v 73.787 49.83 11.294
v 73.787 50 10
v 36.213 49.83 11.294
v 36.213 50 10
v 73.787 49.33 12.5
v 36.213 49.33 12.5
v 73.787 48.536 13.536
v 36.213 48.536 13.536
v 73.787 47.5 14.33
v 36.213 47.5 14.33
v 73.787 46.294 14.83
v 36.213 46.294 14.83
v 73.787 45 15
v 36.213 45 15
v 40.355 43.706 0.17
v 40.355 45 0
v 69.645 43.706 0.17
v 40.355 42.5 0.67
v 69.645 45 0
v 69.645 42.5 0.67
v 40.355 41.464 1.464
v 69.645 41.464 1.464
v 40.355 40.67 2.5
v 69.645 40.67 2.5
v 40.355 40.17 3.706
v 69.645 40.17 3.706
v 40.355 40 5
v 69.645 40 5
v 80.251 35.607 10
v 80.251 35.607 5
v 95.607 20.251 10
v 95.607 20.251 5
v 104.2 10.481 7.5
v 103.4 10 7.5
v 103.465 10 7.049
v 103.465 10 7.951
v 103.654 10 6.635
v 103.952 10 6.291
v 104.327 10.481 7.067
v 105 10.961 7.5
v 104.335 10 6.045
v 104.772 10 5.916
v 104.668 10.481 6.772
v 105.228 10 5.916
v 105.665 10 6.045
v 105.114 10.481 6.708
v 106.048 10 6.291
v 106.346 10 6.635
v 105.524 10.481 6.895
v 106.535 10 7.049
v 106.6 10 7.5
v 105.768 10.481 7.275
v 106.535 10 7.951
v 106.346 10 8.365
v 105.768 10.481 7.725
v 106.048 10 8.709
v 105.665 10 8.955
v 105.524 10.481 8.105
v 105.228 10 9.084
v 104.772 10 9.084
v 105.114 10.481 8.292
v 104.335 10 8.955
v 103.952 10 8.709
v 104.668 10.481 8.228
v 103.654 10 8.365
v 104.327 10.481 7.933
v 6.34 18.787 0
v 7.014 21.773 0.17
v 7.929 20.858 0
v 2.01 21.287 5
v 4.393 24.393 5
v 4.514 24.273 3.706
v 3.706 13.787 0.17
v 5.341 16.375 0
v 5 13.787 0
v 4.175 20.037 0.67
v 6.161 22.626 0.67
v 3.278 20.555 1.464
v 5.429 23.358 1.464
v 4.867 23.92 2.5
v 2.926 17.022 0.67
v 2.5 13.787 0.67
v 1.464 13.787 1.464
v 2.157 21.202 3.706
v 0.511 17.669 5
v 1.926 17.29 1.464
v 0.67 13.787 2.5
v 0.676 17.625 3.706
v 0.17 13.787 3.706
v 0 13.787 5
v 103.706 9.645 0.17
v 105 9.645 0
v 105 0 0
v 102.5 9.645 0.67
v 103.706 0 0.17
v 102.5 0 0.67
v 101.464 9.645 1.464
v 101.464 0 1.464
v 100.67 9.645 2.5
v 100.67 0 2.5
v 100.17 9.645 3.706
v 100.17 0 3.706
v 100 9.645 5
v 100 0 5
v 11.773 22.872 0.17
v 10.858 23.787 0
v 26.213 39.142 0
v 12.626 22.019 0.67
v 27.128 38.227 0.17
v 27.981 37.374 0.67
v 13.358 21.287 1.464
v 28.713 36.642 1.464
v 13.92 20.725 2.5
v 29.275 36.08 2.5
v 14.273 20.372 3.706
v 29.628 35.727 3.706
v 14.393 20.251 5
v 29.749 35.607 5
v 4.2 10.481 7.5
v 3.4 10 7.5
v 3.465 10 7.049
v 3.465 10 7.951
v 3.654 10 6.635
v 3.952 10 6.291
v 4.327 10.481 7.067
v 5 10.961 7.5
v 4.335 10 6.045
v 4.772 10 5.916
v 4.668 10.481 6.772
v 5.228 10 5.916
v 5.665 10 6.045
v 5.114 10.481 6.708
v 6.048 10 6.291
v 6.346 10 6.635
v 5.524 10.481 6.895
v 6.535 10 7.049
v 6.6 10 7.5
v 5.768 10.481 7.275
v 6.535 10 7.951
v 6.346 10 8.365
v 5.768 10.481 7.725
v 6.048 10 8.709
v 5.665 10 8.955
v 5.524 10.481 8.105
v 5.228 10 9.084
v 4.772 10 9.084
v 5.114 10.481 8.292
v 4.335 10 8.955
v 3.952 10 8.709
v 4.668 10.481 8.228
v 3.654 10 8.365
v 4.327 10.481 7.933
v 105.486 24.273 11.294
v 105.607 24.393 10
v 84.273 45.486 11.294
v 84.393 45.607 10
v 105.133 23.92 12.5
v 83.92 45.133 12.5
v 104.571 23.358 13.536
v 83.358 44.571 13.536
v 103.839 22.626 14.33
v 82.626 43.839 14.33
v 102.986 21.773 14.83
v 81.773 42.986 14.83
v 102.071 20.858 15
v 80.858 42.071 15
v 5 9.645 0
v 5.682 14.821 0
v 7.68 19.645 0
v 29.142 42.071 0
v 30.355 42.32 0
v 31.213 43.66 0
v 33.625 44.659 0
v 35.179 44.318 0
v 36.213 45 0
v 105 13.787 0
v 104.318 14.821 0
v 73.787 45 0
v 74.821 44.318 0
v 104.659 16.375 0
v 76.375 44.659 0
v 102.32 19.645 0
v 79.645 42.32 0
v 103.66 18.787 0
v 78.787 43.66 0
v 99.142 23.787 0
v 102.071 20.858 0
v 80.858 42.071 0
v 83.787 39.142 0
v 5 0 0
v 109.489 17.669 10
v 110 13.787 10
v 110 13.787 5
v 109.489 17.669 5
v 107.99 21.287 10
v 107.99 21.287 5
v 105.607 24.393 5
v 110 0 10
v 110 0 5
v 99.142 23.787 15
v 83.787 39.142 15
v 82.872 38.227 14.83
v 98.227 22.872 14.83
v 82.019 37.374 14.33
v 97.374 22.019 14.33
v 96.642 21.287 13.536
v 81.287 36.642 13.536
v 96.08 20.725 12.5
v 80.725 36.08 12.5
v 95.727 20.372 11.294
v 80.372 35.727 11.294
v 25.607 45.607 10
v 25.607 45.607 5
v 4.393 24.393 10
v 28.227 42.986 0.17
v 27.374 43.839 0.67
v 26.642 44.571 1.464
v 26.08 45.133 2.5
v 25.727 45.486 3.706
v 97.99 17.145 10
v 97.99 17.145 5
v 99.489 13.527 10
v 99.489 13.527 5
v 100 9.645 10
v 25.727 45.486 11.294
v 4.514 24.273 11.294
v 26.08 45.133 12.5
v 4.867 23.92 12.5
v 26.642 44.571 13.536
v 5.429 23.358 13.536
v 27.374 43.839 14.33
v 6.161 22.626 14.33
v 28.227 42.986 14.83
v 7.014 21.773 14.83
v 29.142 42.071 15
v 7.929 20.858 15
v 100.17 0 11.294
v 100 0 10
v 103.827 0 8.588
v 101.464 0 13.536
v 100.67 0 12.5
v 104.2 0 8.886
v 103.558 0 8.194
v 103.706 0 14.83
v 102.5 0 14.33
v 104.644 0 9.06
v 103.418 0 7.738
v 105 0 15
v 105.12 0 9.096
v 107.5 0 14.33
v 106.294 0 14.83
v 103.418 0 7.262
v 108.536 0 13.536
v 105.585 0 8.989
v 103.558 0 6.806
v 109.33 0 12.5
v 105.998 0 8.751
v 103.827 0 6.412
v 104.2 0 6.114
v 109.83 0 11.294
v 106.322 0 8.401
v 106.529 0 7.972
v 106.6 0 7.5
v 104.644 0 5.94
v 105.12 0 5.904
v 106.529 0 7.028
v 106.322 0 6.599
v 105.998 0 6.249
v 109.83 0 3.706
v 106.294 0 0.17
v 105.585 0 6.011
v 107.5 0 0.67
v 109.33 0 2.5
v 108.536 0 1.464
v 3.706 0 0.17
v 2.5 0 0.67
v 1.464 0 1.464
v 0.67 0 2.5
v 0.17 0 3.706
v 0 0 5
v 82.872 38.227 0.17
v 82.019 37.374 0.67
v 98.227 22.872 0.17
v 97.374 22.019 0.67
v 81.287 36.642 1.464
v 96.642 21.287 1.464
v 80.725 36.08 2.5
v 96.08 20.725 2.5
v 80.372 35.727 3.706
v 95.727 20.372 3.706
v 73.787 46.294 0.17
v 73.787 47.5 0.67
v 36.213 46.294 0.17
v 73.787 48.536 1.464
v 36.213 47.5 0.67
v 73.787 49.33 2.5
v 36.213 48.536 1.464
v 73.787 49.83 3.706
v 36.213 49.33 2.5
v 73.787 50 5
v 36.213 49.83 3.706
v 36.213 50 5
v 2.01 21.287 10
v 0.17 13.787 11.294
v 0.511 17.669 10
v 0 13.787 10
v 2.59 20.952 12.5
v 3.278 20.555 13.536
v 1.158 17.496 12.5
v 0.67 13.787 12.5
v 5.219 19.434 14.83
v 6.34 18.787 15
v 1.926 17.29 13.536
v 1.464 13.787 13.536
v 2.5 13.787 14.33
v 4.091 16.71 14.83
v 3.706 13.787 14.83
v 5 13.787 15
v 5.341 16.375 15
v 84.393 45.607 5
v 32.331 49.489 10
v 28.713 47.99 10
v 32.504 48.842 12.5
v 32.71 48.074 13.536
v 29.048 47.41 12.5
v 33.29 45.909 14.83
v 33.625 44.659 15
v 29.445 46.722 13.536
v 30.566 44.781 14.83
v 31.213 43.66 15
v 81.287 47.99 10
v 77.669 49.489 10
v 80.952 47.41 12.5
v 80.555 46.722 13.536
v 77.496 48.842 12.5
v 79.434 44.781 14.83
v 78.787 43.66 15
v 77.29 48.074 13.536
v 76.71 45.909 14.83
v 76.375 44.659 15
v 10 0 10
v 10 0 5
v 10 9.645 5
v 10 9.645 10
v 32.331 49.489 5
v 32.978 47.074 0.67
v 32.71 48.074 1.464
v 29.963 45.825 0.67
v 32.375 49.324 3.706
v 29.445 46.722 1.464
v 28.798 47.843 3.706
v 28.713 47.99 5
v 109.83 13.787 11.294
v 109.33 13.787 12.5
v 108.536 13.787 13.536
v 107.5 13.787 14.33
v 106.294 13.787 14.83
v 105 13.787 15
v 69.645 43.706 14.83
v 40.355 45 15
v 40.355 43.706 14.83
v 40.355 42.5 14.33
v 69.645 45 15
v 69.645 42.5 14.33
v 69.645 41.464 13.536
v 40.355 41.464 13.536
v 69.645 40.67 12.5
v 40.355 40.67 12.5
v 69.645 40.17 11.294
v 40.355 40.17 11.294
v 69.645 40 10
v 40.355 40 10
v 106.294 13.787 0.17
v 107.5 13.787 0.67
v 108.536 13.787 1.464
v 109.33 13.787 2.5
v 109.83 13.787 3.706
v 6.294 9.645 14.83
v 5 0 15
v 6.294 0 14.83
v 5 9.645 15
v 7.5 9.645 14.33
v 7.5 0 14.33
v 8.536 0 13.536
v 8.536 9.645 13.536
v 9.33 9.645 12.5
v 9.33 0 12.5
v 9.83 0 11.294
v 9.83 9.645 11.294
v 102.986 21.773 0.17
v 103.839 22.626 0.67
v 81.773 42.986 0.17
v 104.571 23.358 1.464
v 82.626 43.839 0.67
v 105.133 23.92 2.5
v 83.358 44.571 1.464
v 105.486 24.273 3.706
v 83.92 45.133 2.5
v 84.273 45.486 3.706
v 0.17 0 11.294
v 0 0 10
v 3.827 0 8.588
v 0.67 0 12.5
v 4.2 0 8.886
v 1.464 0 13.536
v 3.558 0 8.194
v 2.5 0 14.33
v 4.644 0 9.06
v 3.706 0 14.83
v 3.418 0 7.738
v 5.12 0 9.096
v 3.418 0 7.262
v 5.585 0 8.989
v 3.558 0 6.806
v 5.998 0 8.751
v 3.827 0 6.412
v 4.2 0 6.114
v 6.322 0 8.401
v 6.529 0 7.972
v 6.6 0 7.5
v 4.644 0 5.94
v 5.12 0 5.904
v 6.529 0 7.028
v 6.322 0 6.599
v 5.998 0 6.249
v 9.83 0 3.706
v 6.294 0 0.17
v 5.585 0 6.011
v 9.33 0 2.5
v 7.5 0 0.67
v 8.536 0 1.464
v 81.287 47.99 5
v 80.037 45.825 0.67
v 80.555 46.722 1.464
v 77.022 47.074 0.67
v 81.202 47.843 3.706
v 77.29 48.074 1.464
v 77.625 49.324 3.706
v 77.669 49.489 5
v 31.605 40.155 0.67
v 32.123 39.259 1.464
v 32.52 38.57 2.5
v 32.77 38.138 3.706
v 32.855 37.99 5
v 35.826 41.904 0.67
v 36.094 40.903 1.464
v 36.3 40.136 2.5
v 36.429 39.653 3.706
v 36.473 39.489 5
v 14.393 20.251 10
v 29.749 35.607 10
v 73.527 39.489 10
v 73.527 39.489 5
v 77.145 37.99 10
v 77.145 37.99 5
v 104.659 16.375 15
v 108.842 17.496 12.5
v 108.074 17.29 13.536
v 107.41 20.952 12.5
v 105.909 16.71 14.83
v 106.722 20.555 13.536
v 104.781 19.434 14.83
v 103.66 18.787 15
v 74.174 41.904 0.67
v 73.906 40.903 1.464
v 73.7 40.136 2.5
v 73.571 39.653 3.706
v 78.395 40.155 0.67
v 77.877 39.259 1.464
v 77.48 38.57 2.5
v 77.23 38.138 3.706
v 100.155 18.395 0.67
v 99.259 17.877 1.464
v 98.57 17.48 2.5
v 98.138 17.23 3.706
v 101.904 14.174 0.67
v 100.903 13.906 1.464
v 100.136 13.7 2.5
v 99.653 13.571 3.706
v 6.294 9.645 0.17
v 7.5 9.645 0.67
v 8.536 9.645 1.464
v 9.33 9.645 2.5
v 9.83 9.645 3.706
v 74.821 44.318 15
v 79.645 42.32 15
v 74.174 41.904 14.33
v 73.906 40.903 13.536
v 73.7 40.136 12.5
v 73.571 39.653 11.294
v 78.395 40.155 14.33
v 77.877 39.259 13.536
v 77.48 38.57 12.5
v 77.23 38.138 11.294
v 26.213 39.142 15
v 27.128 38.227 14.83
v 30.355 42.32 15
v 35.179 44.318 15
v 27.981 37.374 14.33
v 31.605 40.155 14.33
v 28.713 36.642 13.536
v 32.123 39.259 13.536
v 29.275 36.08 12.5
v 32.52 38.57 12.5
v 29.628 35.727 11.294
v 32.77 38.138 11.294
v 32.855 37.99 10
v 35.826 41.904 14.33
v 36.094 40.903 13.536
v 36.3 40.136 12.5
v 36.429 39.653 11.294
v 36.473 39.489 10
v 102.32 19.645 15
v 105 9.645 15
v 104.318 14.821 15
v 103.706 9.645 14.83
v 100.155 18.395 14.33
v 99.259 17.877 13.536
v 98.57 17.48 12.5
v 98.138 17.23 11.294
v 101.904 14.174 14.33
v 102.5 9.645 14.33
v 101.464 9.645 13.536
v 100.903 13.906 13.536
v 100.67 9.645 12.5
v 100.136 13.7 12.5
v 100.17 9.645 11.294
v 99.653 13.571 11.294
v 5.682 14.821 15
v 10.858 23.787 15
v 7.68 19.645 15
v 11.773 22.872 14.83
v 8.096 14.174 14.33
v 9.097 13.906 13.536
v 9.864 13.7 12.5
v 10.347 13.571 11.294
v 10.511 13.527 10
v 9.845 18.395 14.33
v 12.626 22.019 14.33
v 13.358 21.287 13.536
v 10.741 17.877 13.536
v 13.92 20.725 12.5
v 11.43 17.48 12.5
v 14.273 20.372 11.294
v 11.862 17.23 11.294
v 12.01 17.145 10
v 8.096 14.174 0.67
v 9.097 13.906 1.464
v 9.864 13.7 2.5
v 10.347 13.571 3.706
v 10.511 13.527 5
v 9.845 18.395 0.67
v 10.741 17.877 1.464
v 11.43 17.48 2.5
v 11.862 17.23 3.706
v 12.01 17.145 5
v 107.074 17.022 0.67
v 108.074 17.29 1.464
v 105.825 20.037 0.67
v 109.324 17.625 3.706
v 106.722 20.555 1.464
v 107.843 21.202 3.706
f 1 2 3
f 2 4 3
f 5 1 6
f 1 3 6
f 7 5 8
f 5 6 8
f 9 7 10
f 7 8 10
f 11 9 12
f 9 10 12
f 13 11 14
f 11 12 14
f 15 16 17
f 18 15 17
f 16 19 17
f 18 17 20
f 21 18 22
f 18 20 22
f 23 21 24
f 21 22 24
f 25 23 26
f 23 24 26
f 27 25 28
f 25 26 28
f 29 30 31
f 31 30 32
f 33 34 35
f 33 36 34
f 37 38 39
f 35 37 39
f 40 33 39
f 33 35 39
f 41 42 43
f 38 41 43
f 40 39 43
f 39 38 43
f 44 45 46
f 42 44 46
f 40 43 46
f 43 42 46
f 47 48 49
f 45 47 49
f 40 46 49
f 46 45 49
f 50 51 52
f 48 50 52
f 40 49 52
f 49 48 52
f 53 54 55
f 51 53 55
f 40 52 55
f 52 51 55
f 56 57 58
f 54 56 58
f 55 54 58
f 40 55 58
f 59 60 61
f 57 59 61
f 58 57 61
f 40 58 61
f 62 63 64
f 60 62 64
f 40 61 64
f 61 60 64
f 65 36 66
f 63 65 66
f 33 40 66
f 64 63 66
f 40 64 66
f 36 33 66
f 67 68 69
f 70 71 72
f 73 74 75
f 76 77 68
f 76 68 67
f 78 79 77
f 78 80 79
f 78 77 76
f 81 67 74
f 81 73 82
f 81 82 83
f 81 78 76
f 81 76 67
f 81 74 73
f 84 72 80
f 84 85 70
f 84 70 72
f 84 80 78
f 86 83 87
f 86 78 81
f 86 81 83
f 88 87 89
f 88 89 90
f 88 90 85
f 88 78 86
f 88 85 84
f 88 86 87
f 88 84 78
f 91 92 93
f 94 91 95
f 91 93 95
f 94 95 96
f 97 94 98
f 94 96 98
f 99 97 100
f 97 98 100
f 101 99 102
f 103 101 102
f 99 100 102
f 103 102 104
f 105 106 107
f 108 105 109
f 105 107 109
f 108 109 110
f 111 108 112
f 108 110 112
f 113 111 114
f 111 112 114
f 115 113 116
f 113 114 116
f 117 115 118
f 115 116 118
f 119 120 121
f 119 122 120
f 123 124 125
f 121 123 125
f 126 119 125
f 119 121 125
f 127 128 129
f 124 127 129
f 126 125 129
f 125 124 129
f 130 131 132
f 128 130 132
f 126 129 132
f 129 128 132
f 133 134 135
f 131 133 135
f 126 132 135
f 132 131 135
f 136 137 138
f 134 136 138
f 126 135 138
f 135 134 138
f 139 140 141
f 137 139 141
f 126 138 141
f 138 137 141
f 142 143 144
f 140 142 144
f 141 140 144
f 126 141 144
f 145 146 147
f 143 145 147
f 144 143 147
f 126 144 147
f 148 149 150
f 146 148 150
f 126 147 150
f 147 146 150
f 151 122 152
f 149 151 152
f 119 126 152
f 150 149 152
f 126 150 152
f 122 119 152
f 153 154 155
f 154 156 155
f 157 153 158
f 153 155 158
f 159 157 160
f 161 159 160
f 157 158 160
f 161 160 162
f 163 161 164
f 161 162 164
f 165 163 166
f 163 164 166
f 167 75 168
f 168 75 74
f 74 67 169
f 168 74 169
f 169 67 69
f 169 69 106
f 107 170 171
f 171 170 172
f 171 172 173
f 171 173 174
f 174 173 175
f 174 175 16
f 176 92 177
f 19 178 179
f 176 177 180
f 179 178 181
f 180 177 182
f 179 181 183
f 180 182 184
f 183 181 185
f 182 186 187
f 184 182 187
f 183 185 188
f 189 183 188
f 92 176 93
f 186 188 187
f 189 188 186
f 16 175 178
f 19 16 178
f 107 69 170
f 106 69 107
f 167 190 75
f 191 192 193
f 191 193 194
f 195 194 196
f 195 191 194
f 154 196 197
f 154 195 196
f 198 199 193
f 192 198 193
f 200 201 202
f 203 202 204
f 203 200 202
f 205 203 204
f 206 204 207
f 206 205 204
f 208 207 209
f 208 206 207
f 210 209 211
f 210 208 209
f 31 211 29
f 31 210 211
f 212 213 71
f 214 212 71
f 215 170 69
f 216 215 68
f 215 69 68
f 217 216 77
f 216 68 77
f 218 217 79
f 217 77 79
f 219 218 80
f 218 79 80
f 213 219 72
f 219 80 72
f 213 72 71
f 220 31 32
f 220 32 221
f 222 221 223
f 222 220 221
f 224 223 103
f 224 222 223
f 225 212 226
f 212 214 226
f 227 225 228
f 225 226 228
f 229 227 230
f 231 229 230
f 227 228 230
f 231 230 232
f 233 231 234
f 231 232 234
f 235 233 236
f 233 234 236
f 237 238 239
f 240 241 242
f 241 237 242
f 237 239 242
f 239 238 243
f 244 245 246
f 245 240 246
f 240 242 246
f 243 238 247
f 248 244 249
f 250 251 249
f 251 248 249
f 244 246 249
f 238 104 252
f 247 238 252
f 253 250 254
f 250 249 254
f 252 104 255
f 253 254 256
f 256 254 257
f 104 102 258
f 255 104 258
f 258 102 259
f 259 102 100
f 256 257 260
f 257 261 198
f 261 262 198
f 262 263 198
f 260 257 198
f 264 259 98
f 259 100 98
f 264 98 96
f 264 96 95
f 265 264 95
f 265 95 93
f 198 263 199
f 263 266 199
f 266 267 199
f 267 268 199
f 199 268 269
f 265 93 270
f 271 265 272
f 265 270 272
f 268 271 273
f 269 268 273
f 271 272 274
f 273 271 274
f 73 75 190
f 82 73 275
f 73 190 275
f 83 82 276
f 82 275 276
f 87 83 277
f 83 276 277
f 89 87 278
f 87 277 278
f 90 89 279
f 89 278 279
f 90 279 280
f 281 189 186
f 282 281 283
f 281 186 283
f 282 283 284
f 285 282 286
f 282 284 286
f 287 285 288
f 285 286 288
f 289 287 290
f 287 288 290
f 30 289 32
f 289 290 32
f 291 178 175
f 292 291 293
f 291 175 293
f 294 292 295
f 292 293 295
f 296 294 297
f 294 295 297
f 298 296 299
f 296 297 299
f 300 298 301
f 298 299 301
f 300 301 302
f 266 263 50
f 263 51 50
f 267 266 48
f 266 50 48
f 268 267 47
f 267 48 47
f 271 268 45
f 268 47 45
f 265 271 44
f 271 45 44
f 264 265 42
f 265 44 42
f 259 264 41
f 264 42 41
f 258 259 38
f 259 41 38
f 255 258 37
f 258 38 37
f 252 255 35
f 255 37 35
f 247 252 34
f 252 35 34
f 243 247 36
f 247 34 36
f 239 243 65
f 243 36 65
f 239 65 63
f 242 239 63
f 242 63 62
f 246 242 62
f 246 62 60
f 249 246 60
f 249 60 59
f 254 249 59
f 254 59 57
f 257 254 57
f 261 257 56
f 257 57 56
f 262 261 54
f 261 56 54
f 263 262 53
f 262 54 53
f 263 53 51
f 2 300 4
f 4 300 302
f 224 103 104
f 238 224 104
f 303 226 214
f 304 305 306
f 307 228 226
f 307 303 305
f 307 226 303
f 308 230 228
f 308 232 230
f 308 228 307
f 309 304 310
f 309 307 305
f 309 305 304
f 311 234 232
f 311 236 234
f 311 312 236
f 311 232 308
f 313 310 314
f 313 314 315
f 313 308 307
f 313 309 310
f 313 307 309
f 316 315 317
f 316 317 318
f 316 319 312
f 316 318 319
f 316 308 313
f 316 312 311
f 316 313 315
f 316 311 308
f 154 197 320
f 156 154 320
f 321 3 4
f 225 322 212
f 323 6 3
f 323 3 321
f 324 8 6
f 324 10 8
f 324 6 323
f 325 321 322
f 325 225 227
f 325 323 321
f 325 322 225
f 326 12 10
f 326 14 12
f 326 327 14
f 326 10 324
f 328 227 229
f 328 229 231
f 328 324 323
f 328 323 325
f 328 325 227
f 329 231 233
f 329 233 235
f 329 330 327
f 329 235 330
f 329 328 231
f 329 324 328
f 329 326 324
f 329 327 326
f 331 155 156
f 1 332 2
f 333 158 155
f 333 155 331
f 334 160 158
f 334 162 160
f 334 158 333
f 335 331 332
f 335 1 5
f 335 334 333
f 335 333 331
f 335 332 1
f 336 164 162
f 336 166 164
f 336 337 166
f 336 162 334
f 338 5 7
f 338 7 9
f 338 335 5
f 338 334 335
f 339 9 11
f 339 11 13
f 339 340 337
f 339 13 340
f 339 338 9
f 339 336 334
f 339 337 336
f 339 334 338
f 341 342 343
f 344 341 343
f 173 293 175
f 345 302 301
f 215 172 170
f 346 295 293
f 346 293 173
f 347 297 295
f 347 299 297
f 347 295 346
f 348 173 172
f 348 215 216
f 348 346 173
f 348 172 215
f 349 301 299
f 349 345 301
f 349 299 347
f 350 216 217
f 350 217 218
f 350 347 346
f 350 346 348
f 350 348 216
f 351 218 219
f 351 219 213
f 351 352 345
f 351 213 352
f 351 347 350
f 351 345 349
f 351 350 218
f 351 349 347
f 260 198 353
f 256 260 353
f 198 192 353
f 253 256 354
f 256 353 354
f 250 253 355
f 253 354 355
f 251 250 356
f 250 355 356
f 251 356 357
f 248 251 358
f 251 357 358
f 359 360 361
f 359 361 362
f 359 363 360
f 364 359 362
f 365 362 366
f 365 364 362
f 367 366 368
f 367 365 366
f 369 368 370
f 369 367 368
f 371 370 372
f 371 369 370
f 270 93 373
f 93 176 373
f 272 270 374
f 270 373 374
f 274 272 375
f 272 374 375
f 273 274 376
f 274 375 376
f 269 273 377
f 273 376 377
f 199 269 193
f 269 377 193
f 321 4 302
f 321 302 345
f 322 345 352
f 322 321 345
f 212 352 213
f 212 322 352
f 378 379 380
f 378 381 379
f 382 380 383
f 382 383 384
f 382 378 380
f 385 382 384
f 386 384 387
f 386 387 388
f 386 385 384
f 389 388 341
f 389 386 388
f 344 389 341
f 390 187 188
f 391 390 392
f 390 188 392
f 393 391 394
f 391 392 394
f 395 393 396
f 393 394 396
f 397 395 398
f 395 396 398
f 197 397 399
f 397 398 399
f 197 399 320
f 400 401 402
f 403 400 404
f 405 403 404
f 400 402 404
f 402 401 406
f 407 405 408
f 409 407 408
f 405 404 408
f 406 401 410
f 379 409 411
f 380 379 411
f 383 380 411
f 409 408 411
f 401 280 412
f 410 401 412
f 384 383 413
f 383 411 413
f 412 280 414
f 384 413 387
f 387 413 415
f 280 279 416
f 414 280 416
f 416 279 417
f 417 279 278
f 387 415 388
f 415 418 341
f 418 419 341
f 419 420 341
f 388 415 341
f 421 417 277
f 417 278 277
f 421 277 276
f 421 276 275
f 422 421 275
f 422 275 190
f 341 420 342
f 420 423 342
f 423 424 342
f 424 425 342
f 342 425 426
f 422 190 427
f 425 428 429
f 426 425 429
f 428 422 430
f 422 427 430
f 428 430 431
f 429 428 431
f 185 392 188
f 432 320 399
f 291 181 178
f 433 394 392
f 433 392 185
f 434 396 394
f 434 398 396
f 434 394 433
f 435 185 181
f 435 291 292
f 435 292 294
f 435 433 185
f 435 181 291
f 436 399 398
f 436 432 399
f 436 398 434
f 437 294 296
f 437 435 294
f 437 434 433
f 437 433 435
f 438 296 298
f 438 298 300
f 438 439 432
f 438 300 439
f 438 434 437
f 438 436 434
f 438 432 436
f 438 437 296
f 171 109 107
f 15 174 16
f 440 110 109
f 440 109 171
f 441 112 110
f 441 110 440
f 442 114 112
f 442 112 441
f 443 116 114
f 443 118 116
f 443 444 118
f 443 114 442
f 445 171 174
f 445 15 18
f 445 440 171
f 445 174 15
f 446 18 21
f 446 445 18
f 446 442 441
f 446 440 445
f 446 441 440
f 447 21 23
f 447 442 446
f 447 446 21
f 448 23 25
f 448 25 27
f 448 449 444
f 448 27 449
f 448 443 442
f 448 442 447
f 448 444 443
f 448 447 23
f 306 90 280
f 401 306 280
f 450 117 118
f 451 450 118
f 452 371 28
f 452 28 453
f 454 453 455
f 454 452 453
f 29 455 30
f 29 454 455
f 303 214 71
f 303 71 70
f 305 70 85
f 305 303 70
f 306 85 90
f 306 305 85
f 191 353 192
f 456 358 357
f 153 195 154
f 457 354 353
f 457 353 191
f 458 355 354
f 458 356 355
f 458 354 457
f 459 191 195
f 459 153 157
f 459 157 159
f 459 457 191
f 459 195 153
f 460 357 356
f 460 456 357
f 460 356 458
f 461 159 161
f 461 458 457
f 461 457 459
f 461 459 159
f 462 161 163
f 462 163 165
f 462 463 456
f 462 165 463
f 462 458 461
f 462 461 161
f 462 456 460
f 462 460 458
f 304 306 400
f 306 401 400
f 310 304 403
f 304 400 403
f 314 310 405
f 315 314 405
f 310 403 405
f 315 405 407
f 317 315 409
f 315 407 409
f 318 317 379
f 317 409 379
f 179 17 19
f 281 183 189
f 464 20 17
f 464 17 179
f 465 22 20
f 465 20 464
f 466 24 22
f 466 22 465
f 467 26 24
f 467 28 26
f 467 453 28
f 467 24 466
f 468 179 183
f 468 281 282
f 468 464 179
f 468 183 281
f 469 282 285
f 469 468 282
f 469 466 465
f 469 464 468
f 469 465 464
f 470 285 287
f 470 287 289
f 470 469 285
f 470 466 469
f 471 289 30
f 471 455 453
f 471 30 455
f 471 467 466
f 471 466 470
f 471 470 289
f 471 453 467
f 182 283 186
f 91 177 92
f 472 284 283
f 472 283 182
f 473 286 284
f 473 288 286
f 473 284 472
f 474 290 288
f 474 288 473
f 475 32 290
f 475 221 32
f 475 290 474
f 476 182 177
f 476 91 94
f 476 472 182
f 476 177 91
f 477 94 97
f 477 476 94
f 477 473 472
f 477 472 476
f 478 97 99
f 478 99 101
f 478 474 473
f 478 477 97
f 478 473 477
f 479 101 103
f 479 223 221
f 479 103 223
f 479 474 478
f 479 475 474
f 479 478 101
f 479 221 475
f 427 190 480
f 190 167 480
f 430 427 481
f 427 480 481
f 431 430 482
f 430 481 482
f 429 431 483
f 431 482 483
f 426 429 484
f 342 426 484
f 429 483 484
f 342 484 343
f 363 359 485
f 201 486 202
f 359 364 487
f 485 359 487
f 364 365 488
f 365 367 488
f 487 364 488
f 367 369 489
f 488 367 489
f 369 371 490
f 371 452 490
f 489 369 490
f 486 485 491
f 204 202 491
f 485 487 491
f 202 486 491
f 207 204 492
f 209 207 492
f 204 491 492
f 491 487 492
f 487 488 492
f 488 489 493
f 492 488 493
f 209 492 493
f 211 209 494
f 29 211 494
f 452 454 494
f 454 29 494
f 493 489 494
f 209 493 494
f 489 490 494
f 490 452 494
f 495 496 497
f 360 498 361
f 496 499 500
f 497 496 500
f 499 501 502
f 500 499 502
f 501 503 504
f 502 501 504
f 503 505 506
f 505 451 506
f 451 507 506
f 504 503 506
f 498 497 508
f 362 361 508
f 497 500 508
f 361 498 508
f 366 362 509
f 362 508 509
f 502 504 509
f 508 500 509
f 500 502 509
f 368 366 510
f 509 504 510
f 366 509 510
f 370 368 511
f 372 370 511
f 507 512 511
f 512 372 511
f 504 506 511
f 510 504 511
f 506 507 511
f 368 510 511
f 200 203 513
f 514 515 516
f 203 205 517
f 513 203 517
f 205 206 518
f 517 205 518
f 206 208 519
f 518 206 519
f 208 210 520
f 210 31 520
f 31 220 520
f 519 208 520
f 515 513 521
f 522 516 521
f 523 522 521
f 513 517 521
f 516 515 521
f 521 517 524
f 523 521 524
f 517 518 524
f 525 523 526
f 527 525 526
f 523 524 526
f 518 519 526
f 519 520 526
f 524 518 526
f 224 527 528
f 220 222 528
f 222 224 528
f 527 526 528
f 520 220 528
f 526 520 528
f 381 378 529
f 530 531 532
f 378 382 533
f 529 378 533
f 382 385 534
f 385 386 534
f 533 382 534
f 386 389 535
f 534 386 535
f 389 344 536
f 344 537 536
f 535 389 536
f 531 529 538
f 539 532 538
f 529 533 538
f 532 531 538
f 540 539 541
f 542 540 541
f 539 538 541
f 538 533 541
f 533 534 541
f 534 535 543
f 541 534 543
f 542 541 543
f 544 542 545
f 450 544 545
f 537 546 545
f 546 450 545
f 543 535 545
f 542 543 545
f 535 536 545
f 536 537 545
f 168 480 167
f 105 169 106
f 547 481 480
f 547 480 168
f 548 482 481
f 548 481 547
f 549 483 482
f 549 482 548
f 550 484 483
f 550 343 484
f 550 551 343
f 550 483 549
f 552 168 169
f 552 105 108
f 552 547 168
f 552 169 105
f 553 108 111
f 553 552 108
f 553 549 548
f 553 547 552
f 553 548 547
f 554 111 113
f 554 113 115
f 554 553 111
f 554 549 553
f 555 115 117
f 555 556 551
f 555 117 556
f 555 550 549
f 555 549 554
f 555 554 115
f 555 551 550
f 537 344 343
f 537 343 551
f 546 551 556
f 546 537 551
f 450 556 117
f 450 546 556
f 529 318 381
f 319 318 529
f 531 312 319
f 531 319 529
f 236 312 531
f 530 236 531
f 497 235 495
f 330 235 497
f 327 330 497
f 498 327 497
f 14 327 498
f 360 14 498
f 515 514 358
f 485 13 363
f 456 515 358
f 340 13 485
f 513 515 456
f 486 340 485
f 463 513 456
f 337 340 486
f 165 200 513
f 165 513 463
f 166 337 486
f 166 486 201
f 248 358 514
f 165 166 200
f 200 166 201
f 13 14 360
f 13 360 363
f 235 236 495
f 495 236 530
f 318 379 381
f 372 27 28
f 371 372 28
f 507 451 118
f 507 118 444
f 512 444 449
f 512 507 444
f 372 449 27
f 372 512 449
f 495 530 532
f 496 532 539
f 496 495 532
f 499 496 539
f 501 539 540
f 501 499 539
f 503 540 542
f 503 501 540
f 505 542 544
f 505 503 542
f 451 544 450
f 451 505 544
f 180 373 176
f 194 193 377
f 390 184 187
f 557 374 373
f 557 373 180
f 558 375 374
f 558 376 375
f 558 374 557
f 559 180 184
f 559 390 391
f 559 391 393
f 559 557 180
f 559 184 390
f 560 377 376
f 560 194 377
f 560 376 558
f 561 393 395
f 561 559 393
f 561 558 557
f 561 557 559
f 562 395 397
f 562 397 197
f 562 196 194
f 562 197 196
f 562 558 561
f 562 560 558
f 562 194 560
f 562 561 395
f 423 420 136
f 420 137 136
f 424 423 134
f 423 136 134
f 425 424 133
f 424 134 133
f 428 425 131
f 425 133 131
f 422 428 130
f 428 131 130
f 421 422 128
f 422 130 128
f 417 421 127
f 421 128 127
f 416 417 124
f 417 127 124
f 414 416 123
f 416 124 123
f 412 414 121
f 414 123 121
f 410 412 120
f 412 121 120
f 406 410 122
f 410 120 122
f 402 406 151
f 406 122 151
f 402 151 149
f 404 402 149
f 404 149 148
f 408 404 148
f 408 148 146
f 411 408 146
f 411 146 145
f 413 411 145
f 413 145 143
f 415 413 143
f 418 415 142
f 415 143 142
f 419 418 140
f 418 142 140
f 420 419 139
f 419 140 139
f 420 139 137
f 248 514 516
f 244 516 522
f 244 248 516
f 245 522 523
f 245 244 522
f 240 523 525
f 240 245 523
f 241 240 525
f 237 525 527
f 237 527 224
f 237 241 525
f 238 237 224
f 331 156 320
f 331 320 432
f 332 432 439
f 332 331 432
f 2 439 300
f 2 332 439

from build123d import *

# Parameters (mm, degrees)
BOSS_EXTRU_1_DEPTH                  = 15
CONG_4_R                            = 15
CONG_5_R                            = 5
DIAM_TRE_DU_PER_AGE_3_2_3_2_1_D     = 3.2
DIAM_TRE_DU_PER_AGE_3_2_3_2_1_DEPTH = 10
DIAM_TRE_DU_PER_AGE_3_2_3_2_1_TIP   = 0.96137699


with BuildPart() as part:
    # Esquisse1 → Boss.-Extru.1 (new body)
    with BuildSketch(Plane.XY):
        Polygon((100, 0), (110, 0), (110, 20), (80, 50), (30, 50), (0, 20), (0, 0), (10, 0), (10, 15.857864376), (34.142135624, 40), (75.857864376, 40), (100, 15.857864376), align=None)
    extrude(amount=BOSS_EXTRU_1_DEPTH)

    # Congé4
    cong_4_edges = [part.edges().sort_by_distance(p)[0] for p in [
        (0, 20, 7.5),
        (30, 50, 7.5),
        (80, 50, 7.5),
        (110, 20, 7.5),
        (100, 15.857864376, 7.5),
        (75.857864376, 40, 7.5),
        (34.142135624, 40, 7.5),
        (10, 15.857864376, 7.5),
    ]]
    fillet(cong_4_edges, radius=CONG_4_R)

    # Congé5
    cong_5_edges = [part.edges().sort_by_distance(p)[0] for p in [
        (100, 4.82233047, 0),
        (98.858192988, 15.384912426, 0),
        (87.928932188, 27.928932188, 0),
        (75.384912426, 38.858192988, 0),
        (55, 40, 0),
        (34.615087574, 38.858192988, 0),
        (22.071067812, 27.928932188, 0),
        (11.141807012, 15.384912426, 0),
        (10, 4.82233047, 0),
        (0, 6.893398282, 0),
        (1.141807012, 19.52704805, 0),
        (15, 35, 0),
        (30.47295195, 48.858192988, 0),
        (55, 50, 0),
        (79.52704805, 48.858192988, 0),
        (95, 35, 0),
        (108.858192988, 19.52704805, 0),
        (110, 6.893398282, 0),
        (110, 6.893398282, 15),
        (108.858192988, 19.52704805, 15),
        (95, 35, 15),
        (79.52704805, 48.858192988, 15),
        (0, 6.893398282, 15),
        (1.141807012, 19.52704805, 15),
        (15, 35, 15),
        (30.47295195, 48.858192988, 15),
        (10, 4.82233047, 15),
        (11.141807012, 15.384912426, 15),
        (22.071067812, 27.928932188, 15),
        (34.615087574, 38.858192988, 15),
        (55, 40, 15),
        (75.384912426, 38.858192988, 15),
        (100, 4.82233047, 15),
        (98.858192988, 15.384912426, 15),
        (55, 50, 15),
        (87.928932188, 27.928932188, 15),
    ]]
    fillet(cong_5_edges, radius=CONG_5_R - 0.0001)  # a hair under: the kernel refuses the full size

    # Diamètre du perçage Ø3.2 (3.2)1
    with Locations(Plane(origin=(0, 0, 0), x_dir=(-1, 0, 0), z_dir=(0, -1, 0))):
        with Locations((-105, -7.5), (-5, -7.5)):
            Hole(DIAM_TRE_DU_PER_AGE_3_2_3_2_1_D / 2, depth=DIAM_TRE_DU_PER_AGE_3_2_3_2_1_DEPTH)
            with Locations((0, 0, -(DIAM_TRE_DU_PER_AGE_3_2_3_2_1_DEPTH + DIAM_TRE_DU_PER_AGE_3_2_3_2_1_TIP / 2))):  # 118° drill point
                Cone(0, DIAM_TRE_DU_PER_AGE_3_2_3_2_1_D / 2, DIAM_TRE_DU_PER_AGE_3_2_3_2_1_TIP, mode=Mode.SUBTRACT)


solid = part.part
